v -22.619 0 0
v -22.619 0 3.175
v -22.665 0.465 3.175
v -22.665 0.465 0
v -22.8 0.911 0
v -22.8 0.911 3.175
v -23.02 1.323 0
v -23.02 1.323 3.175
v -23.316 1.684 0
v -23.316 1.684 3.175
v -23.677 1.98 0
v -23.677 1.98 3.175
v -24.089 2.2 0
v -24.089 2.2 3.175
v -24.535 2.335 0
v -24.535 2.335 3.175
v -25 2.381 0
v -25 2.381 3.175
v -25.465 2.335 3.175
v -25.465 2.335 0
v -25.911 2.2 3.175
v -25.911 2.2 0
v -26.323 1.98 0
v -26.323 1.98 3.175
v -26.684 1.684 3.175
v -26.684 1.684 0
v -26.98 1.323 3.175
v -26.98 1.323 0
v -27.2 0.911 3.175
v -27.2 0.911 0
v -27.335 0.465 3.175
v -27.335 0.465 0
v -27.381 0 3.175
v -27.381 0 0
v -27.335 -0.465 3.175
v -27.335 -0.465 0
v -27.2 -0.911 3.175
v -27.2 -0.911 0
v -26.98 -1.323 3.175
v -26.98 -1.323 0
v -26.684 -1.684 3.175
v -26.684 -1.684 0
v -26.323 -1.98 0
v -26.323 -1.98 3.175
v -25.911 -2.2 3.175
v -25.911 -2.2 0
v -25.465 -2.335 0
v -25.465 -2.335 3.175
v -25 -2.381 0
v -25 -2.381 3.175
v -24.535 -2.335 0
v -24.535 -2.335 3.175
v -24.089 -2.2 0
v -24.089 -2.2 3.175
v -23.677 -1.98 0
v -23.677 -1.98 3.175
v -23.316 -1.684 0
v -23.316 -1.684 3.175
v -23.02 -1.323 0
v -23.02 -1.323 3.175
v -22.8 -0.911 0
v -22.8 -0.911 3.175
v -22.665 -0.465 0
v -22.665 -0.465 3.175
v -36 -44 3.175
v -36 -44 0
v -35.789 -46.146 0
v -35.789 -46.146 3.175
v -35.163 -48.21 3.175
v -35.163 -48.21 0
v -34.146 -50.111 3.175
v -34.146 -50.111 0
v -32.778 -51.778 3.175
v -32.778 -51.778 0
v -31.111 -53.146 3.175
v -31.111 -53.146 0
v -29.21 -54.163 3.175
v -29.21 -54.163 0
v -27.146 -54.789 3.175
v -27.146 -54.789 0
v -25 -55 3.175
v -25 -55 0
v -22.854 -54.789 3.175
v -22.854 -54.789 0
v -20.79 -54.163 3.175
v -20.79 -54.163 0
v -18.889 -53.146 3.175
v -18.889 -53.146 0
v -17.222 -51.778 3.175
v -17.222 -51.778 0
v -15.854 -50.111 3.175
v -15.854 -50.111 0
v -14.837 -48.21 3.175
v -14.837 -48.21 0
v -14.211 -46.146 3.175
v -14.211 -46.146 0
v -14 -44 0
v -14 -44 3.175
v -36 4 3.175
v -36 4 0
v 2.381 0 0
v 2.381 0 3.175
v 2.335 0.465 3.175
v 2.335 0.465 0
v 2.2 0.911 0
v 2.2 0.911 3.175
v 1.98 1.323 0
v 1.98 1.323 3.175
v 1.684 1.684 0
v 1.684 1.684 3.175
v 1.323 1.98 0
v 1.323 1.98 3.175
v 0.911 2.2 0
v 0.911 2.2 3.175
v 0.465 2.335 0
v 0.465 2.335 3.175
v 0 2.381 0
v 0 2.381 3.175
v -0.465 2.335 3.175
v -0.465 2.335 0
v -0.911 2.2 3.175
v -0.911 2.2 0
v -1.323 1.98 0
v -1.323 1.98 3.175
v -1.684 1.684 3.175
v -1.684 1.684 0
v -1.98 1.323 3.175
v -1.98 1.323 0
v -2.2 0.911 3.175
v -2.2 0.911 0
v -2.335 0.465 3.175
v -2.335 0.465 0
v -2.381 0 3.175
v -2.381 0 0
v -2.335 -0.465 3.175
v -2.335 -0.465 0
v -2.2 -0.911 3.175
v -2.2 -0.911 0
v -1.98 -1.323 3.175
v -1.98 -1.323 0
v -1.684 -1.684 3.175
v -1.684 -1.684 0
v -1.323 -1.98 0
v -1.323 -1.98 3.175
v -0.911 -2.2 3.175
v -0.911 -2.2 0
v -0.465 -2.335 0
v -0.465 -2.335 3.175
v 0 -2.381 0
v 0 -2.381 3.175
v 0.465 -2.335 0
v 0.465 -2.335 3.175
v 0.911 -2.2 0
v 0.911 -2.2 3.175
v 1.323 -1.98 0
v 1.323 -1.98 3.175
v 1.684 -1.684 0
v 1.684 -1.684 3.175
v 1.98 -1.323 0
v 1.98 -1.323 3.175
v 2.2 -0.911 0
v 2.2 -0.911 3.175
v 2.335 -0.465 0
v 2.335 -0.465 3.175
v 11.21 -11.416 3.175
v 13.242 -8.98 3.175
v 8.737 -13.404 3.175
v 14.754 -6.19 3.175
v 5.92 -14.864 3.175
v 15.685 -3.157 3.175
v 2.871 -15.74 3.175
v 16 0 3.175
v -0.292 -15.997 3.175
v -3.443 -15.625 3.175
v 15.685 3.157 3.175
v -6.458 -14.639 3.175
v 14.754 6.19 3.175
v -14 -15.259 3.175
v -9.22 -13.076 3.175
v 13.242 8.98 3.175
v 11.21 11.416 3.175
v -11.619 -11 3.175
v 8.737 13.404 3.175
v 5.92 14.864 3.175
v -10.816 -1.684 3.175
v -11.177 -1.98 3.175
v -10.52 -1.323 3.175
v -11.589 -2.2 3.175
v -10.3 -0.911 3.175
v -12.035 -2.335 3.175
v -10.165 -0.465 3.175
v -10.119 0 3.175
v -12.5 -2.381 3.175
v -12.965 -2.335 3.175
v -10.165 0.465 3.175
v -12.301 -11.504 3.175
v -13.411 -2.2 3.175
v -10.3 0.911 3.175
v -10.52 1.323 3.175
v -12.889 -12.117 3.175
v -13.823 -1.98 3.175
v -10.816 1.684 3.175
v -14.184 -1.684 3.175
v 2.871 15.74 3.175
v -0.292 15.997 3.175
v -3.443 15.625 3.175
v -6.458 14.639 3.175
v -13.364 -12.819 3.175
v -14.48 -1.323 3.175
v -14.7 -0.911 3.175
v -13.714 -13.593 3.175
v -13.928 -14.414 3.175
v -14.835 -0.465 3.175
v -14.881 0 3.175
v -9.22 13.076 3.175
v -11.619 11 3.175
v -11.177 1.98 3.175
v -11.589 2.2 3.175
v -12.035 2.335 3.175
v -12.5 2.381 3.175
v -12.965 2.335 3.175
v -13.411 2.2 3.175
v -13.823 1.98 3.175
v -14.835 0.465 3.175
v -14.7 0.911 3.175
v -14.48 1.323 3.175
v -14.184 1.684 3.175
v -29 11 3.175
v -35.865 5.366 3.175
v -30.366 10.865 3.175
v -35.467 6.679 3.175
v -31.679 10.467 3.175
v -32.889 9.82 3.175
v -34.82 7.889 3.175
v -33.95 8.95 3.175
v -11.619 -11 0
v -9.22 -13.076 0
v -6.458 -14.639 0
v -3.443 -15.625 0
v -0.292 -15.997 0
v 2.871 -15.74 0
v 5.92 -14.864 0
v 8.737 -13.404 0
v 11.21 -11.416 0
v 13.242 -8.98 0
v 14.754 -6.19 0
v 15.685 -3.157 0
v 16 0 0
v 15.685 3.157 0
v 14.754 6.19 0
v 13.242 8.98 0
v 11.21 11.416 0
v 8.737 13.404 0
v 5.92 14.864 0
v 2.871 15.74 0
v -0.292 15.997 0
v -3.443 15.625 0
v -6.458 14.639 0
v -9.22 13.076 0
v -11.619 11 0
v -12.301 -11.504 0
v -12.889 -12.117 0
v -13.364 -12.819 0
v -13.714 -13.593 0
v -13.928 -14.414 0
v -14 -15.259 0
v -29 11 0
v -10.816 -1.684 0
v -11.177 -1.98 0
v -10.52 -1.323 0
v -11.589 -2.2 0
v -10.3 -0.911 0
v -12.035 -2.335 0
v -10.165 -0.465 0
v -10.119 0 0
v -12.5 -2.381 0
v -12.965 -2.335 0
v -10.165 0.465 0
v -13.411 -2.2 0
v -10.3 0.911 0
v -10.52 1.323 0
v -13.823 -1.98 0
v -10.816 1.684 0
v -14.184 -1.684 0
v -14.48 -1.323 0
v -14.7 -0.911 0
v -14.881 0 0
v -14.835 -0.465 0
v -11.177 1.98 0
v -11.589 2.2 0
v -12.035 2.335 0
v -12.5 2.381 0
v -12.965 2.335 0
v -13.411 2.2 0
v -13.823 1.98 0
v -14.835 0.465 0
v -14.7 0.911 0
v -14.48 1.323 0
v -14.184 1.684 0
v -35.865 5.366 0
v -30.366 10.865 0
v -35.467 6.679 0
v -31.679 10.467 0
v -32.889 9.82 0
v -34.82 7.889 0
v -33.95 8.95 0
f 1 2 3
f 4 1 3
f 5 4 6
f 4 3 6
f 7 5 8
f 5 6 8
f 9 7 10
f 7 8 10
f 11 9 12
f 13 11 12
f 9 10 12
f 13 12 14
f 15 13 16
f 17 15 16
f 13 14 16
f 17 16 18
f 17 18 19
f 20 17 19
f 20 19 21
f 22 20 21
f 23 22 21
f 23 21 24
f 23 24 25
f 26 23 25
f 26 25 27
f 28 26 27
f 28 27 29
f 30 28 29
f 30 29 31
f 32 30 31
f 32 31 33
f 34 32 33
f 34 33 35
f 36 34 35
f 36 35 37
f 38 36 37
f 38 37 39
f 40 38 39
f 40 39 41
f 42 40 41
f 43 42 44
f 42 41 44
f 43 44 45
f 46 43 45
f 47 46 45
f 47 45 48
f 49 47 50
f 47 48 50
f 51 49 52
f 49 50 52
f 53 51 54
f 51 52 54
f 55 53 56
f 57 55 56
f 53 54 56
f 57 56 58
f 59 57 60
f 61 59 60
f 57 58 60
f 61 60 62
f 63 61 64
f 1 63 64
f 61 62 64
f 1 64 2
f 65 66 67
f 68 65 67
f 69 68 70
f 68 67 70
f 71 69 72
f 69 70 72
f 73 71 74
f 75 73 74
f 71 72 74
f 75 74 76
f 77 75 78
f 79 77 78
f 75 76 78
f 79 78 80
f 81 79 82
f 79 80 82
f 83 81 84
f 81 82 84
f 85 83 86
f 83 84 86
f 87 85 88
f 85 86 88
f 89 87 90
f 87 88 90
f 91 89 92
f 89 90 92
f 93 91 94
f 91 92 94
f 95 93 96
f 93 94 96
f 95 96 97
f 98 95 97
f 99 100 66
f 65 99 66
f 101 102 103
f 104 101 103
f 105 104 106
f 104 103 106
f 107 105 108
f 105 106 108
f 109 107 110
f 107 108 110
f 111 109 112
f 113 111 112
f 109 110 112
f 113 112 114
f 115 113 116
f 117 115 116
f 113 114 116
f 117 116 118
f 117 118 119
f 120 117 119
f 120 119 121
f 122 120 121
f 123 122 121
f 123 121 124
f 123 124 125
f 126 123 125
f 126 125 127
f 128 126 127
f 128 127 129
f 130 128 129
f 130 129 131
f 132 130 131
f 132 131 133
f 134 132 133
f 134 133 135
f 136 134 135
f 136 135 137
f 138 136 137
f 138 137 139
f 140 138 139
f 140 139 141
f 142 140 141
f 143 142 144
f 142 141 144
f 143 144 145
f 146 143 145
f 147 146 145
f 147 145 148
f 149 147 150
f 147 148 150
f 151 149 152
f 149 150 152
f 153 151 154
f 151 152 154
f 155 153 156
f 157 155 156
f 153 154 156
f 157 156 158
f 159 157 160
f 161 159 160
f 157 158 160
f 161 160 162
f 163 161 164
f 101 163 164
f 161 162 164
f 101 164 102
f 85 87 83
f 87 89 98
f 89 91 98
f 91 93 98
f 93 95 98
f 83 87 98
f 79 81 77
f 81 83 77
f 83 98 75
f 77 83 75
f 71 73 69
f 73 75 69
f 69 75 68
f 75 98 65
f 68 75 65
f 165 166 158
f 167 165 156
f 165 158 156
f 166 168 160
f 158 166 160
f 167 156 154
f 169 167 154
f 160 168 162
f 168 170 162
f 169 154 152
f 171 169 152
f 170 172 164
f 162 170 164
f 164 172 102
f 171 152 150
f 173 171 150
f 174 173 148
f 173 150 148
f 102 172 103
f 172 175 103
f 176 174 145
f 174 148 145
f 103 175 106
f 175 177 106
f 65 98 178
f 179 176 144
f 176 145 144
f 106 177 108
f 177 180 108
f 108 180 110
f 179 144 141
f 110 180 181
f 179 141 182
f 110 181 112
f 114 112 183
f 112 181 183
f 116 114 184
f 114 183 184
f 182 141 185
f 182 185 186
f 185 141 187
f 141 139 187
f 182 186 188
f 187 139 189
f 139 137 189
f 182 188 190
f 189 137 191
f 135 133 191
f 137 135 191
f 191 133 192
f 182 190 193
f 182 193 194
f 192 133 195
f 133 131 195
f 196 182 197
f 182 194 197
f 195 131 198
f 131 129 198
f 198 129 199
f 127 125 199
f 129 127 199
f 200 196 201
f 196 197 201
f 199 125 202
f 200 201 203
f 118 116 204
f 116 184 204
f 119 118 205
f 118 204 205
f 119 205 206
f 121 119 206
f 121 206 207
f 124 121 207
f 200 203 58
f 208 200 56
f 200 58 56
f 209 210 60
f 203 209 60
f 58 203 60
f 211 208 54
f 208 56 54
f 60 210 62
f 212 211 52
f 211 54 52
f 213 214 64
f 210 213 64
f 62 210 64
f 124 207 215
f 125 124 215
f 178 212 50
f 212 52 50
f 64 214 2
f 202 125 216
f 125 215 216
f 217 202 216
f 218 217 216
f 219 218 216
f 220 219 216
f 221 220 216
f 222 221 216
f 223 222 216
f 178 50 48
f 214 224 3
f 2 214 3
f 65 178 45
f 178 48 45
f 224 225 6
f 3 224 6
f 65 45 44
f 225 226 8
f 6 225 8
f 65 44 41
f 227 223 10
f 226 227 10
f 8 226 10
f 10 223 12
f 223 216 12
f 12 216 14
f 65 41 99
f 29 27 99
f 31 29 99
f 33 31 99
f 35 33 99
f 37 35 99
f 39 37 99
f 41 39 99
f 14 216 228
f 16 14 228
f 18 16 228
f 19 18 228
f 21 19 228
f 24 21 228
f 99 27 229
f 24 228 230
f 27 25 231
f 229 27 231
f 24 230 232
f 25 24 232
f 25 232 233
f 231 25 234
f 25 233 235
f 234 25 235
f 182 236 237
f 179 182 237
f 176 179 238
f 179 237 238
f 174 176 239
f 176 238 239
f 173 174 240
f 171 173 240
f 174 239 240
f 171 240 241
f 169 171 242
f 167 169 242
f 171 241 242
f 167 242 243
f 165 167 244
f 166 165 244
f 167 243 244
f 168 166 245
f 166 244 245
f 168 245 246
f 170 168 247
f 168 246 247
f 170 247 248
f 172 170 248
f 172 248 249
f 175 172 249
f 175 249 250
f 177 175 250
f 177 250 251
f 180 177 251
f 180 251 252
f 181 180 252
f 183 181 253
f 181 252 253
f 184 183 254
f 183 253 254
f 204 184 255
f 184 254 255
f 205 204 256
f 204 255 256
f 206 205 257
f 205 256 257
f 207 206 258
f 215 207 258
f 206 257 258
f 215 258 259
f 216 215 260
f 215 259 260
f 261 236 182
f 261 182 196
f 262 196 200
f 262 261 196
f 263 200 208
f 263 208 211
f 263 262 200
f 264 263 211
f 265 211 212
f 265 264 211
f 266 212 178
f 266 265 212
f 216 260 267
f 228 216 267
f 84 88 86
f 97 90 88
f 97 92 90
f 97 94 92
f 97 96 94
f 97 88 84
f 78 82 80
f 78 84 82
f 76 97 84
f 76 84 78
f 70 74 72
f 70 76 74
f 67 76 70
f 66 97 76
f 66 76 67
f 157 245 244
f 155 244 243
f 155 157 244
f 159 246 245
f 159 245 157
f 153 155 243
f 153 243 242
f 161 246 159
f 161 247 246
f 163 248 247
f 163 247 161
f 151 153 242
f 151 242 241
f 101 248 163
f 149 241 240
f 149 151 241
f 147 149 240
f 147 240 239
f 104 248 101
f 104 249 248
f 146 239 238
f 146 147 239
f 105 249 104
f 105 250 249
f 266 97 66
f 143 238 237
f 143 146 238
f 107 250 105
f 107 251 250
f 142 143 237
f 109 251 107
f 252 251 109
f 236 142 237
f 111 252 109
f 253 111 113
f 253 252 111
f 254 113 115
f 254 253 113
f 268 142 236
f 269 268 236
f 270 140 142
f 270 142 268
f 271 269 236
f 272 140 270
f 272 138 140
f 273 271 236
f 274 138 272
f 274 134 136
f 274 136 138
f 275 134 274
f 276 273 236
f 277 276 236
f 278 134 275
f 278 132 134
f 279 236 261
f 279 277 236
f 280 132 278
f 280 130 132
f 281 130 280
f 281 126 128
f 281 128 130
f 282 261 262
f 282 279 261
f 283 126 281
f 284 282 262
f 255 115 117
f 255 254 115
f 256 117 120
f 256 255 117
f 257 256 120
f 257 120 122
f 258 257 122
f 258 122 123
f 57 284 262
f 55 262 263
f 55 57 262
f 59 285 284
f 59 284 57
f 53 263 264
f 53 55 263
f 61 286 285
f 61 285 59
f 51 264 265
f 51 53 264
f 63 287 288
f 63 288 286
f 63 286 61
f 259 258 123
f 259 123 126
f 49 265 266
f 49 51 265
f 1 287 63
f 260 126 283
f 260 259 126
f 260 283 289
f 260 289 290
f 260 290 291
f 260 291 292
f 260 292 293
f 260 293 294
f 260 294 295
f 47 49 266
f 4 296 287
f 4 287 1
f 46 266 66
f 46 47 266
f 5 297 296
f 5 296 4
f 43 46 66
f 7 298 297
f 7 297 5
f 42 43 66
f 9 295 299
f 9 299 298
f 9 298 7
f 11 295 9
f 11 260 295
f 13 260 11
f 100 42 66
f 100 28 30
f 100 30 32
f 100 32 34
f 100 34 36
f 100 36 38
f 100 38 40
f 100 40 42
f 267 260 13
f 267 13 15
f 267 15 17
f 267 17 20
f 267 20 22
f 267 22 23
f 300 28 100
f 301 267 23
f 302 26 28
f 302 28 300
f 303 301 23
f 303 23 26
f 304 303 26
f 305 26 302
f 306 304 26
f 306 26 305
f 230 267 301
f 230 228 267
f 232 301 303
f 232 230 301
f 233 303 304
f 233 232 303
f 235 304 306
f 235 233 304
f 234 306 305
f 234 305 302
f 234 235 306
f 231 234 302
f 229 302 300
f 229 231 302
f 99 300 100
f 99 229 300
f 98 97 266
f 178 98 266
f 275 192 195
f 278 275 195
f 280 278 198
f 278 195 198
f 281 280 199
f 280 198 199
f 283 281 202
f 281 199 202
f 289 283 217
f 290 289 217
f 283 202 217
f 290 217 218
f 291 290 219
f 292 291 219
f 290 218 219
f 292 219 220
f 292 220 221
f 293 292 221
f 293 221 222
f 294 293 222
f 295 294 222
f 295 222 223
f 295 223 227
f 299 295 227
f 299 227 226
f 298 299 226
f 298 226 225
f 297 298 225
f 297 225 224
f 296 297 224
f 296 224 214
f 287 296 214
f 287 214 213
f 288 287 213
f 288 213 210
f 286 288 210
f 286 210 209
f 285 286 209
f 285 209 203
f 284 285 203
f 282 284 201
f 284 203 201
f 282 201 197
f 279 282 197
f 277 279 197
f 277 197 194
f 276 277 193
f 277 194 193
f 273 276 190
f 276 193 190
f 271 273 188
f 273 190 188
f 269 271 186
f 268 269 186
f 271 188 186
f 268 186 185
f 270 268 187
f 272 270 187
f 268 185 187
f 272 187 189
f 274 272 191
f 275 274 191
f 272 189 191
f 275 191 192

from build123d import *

# Parameters (mm, degrees)
BOSS_EXTRUDE1_DEPTH = 3.175
FILLET1_R           = 7
FILLET2_R           = 5
SKETCH2_R           = 2.38125
CUT_EXTRUDE1_DEPTH  = 66.810946088
LPATTERN1_COUNT     = 3
LPATTERN1_PITCH     = 12.5


with BuildPart() as part:
    # Sketch1 → Boss-Extrude1 (new body)
    with BuildSketch(Plane.XY):
        with BuildLine():
            Line((-11.618950039, 11), (-36, 11))
            Line((-36, 11), (-36, -44))
            ThreePointArc((-36, -44), (-25, -55), (-14, -44))
            Line((-14, -44), (-14, -11))
            Line((-14, -11), (-11.618950039, -11))
            ThreePointArc((-11.618950039, -11), (16, 0), (-11.618950039, 11))
        make_face()
    extrude(amount=BOSS_EXTRUDE1_DEPTH)

    # Fillet1
    fillet1_edges = [part.edges().sort_by_distance(p)[0] for p in [
        (-36, 11, 1.5875),
    ]]
    fillet(fillet1_edges, radius=FILLET1_R)

    # Fillet2
    # the kernel refuses this fillet: 5 mm, written as the material it adds along each edge
    with BuildSketch(Plane(origin=(-14, -11, 0), x_dir=(1, 0, 0), z_dir=(0, 0, 1))) as fillet2_piece_1:
        with BuildLine():
            CenterArc((5, -4.259237102), FILLET2_R, 121.586822832, 58.413177168)
            Line((0, -4.259237102), (-0.1, -4.259237102))
            Line((-0.1, -4.259237102), (-0.1, 0))
            Line((-0.1, 0), (0, 0.1))
            ThreePointArc((0, 0.1), (1.190524981, 0.1), (2.328670961, 0.085184742))
            Line((2.328670961, 0.085184742), (2.381049961, 0))
        make_face()
    extrude(amount=3.175)

    # Sketch2 → Cut-Extrude1 (cut, through all)
    with BuildSketch(Plane.XY.offset(3.175)):
        Circle(SKETCH2_R)
    cut_extrude1 = extrude(amount=-CUT_EXTRUDE1_DEPTH, mode=Mode.SUBTRACT)

    # LPattern1: Cut-Extrude1 ×3
    with Locations(*[(-i * LPATTERN1_PITCH, 0, 0) for i in range(1, LPATTERN1_COUNT)]):
        add(cut_extrude1, mode=Mode.SUBTRACT)


solid = part.part
